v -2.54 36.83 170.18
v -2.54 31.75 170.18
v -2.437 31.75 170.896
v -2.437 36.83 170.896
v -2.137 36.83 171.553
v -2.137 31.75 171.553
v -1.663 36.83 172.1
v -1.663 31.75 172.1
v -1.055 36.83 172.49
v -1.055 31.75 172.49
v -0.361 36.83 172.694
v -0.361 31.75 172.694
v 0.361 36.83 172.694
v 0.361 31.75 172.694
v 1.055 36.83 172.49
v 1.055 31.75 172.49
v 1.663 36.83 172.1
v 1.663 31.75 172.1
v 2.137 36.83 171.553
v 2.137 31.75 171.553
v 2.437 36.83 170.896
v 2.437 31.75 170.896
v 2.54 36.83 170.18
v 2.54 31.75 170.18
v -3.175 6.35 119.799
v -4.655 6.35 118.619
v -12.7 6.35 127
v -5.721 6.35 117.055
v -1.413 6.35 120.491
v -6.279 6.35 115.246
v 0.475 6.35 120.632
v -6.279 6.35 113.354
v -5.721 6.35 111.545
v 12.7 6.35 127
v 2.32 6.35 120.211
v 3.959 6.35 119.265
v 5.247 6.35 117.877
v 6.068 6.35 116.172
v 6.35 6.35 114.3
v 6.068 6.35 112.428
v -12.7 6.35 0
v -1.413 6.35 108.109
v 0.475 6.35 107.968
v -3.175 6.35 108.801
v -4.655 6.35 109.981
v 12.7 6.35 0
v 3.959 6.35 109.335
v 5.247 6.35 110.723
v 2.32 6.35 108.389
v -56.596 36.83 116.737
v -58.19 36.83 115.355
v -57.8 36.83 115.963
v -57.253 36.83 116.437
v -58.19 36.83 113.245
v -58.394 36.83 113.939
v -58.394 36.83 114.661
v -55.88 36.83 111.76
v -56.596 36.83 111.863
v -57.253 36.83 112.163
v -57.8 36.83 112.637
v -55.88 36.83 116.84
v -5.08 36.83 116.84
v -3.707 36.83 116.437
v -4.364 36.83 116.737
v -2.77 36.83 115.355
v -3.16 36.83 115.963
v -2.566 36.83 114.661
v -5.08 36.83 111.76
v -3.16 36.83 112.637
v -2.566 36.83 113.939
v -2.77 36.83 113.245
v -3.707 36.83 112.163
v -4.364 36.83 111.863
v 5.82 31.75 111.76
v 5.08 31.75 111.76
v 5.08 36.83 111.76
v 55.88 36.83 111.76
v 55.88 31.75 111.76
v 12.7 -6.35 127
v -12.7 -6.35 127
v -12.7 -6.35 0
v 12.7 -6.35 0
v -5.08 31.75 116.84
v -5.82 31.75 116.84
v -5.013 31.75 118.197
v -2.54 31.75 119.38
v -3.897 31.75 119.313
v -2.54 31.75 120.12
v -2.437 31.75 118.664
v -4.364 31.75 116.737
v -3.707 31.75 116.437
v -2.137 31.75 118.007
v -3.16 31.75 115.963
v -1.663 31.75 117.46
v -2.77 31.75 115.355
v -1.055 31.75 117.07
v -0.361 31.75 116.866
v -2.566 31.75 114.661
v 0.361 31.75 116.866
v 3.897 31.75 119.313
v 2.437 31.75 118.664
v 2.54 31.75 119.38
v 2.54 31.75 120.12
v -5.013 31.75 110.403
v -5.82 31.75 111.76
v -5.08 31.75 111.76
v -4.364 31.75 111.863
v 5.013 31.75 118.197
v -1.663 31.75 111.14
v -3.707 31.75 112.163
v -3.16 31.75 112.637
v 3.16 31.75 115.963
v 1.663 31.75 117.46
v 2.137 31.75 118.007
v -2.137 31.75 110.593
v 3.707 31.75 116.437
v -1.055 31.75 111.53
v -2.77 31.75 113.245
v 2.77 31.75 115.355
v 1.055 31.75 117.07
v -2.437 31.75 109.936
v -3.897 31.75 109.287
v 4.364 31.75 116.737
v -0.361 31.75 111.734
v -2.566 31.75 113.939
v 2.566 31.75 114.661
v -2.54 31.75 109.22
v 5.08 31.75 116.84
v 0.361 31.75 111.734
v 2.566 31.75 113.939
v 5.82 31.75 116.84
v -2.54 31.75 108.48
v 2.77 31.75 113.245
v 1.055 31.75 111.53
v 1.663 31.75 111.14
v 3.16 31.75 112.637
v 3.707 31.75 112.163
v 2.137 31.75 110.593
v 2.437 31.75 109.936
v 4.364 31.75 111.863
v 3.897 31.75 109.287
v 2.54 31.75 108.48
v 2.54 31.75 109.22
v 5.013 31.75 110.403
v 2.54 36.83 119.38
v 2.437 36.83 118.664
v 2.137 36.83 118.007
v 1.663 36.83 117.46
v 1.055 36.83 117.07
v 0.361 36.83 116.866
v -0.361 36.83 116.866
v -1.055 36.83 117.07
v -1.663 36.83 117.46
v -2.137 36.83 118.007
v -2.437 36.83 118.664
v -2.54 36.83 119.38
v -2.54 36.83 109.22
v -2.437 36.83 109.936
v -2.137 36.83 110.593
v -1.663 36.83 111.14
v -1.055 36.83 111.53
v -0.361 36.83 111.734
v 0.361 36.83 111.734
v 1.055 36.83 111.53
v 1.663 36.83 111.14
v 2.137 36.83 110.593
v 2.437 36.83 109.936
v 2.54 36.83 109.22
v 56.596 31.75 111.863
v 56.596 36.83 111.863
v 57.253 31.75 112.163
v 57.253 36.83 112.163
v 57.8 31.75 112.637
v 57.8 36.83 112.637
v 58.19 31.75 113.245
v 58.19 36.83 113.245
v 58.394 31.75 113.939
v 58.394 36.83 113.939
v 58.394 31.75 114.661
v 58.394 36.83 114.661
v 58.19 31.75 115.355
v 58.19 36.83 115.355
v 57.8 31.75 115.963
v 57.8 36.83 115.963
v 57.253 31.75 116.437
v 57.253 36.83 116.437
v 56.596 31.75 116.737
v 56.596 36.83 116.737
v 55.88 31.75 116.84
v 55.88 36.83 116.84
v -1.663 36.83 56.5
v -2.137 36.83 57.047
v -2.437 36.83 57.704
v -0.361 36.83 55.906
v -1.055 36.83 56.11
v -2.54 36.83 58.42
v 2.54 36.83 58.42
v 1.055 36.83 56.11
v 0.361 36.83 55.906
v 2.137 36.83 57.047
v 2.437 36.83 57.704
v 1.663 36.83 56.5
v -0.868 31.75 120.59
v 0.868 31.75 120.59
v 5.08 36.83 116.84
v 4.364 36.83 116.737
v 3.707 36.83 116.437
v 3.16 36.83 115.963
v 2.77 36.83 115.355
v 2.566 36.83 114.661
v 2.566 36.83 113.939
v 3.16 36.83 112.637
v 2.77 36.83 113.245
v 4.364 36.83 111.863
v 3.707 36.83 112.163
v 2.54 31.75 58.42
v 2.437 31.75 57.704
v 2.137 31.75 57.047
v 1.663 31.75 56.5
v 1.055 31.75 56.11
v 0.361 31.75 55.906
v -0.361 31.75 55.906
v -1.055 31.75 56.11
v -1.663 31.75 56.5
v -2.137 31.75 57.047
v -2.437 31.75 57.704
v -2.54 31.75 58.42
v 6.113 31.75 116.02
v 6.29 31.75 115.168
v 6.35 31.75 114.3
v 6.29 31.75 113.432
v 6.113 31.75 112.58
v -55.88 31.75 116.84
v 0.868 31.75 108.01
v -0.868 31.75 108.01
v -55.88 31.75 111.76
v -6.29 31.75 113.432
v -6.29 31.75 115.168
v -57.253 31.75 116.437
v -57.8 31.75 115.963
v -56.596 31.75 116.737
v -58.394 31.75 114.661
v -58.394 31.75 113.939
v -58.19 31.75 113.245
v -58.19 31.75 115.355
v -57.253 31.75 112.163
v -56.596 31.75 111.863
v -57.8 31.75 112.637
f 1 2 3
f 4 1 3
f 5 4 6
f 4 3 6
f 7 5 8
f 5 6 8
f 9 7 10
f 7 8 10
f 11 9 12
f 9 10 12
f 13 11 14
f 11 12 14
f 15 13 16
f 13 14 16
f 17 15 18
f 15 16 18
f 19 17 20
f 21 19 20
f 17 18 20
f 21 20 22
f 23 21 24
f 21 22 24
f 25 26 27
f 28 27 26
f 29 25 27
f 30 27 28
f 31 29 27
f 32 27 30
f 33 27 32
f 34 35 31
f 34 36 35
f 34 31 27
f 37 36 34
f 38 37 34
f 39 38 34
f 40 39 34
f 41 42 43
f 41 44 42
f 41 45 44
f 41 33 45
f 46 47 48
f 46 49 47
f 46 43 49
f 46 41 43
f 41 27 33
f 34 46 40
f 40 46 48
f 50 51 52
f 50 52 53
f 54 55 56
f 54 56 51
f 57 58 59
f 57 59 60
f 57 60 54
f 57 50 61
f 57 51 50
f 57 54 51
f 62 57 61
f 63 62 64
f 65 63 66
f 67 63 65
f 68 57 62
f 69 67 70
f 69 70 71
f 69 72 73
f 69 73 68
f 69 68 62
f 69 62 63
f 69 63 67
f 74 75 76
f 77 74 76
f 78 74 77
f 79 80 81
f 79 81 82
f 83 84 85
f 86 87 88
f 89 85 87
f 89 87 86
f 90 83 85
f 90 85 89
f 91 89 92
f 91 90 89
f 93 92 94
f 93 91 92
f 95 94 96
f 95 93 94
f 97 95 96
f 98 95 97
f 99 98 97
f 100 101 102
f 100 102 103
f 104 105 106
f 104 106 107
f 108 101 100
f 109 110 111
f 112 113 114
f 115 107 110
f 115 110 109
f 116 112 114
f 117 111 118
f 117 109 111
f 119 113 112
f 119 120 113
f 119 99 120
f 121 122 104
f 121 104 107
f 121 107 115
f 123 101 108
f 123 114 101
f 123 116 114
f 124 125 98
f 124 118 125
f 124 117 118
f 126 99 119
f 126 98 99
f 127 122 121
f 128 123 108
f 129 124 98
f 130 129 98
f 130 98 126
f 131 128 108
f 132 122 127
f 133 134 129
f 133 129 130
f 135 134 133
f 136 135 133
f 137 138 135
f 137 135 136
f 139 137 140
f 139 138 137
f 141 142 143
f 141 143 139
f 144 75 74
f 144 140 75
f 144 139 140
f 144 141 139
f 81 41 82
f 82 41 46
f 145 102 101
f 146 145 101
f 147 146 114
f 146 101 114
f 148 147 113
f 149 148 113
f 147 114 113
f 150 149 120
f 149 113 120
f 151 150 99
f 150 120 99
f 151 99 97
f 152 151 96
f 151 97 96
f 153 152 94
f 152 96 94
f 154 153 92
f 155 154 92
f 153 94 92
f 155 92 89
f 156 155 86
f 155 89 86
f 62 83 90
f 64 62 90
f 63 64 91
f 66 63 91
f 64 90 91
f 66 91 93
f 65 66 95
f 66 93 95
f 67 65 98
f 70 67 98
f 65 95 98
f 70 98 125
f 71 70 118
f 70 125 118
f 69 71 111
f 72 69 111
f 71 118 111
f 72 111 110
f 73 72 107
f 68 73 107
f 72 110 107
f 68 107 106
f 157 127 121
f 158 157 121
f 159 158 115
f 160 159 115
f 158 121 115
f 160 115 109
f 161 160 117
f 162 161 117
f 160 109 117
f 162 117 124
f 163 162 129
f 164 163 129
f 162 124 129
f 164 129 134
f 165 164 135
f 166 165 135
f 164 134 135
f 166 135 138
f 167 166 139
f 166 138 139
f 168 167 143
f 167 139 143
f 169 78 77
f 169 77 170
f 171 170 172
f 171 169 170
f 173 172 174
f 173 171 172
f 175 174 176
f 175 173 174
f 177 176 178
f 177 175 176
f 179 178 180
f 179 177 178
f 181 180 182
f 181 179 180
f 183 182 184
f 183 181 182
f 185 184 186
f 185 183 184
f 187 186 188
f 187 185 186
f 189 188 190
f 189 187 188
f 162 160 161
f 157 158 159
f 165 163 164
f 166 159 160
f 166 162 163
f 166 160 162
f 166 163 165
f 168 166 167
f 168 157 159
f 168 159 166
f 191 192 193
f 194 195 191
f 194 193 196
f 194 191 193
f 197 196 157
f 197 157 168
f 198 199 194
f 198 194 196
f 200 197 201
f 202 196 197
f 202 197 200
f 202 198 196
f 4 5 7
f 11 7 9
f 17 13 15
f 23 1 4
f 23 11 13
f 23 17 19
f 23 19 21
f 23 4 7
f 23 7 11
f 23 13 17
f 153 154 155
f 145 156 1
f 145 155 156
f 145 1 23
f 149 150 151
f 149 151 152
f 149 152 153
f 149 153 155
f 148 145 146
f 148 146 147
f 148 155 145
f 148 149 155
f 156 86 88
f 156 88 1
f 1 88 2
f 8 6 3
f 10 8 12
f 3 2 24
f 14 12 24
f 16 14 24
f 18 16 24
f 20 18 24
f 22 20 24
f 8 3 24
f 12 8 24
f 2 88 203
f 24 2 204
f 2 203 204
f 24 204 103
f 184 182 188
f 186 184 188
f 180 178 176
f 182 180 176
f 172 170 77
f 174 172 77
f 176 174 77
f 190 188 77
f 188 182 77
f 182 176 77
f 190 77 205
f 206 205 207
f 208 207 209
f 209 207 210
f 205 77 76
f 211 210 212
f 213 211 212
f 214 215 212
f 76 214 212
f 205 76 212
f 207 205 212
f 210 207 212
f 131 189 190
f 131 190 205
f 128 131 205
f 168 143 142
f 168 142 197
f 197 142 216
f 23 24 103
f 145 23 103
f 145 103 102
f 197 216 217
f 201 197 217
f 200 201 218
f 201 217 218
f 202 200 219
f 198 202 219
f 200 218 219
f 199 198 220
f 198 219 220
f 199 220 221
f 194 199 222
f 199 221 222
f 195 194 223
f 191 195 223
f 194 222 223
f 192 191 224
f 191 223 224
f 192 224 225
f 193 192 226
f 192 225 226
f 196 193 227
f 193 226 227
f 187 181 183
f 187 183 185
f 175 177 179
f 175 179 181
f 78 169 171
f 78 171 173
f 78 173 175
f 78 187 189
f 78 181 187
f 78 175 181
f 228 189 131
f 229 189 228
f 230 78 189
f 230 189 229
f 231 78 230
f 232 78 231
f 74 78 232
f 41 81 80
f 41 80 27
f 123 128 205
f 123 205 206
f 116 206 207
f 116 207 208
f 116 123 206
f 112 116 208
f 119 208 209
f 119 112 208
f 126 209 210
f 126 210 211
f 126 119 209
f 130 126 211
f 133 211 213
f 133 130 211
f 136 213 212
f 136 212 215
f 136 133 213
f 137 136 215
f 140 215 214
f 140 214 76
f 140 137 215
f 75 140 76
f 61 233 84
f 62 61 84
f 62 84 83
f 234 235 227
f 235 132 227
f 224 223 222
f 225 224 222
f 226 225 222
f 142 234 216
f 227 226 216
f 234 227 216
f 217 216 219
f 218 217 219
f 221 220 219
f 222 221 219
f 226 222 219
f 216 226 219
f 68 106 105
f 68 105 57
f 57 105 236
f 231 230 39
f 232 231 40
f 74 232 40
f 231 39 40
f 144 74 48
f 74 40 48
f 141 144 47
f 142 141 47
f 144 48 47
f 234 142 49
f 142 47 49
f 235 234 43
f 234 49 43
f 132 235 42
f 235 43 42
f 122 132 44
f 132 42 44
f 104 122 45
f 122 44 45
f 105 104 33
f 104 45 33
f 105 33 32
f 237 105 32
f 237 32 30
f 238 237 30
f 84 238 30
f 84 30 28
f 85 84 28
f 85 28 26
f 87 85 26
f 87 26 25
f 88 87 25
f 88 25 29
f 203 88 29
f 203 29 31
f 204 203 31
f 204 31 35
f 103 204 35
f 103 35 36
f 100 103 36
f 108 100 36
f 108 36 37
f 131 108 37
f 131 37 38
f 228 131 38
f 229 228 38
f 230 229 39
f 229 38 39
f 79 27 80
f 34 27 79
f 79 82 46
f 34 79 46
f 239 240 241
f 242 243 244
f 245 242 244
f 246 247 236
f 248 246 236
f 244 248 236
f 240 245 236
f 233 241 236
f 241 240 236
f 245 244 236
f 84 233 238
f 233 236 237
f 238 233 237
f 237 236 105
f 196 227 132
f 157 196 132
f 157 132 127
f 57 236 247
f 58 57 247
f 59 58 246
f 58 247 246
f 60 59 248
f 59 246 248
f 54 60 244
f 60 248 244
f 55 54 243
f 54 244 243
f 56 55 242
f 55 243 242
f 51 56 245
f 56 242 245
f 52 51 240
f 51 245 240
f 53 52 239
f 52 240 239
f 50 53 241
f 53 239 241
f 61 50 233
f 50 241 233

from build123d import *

# Parameters (mm, degrees)
SKETCH1_W           = 25.4
SKETCH1_H           = 12.7
BOSS_EXTRUDE1_DEPTH = 127
SKETCH2_R           = 6.35
BOSS_EXTRUDE2_DEPTH = 25.4
BOSS_EXTRUDE3_DEPTH = 5.08


with BuildPart() as part:
    # Sketch1 → Boss-Extrude1 (new body)
    with BuildSketch(Plane.XY):
        Rectangle(SKETCH1_W, SKETCH1_H)
    extrude(amount=BOSS_EXTRUDE1_DEPTH)

    # Sketch2 → Boss-Extrude2 (add)
    with BuildSketch(Plane(origin=(0, 6.35, 0), x_dir=(1, 0, 0), z_dir=(0, 1, 0))):
        with Locations((0, -114.3)):
            Circle(SKETCH2_R)
    extrude(amount=BOSS_EXTRUDE2_DEPTH)

    # Sketch3 → Boss-Extrude3 (add)
    with BuildSketch(Plane(origin=(0, 31.75, 0), x_dir=(1, 0, 0), z_dir=(0, 1, 0))):
        with BuildLine():
            Line((5.08, -111.76), (55.88, -111.76))
            ThreePointArc((55.88, -111.76), (58.42, -114.3), (55.88, -116.84))
            Line((55.88, -116.84), (5.08, -116.84))
            ThreePointArc((5.08, -116.84), (2.54, -114.3), (5.08, -111.76))
        make_face()
        with BuildLine():
            Line((-2.54, -119.38), (-2.54, -170.18))
            ThreePointArc((-2.54, -170.18), (0, -172.72), (2.54, -170.18))
            Line((2.54, -170.18), (2.54, -119.38))
            ThreePointArc((2.54, -119.38), (0, -116.84), (-2.54, -119.38))
        make_face()
        with BuildLine():
            Line((-5.08, -111.76), (-55.88, -111.76))
            ThreePointArc((-55.88, -111.76), (-58.42, -114.3), (-55.88, -116.84))
            Line((-55.88, -116.84), (-5.08, -116.84))
            ThreePointArc((-5.08, -116.84), (-2.54, -114.3), (-5.08, -111.76))
        make_face()
        with BuildLine():
            Line((2.54, -109.22), (2.54, -58.42))
            ThreePointArc((2.54, -58.42), (0, -55.88), (-2.54, -58.42))
            Line((-2.54, -58.42), (-2.54, -109.22))
            ThreePointArc((-2.54, -109.22), (0, -111.76), (2.54, -109.22))
        make_face()
    extrude(amount=BOSS_EXTRUDE3_DEPTH)


solid = part.part
